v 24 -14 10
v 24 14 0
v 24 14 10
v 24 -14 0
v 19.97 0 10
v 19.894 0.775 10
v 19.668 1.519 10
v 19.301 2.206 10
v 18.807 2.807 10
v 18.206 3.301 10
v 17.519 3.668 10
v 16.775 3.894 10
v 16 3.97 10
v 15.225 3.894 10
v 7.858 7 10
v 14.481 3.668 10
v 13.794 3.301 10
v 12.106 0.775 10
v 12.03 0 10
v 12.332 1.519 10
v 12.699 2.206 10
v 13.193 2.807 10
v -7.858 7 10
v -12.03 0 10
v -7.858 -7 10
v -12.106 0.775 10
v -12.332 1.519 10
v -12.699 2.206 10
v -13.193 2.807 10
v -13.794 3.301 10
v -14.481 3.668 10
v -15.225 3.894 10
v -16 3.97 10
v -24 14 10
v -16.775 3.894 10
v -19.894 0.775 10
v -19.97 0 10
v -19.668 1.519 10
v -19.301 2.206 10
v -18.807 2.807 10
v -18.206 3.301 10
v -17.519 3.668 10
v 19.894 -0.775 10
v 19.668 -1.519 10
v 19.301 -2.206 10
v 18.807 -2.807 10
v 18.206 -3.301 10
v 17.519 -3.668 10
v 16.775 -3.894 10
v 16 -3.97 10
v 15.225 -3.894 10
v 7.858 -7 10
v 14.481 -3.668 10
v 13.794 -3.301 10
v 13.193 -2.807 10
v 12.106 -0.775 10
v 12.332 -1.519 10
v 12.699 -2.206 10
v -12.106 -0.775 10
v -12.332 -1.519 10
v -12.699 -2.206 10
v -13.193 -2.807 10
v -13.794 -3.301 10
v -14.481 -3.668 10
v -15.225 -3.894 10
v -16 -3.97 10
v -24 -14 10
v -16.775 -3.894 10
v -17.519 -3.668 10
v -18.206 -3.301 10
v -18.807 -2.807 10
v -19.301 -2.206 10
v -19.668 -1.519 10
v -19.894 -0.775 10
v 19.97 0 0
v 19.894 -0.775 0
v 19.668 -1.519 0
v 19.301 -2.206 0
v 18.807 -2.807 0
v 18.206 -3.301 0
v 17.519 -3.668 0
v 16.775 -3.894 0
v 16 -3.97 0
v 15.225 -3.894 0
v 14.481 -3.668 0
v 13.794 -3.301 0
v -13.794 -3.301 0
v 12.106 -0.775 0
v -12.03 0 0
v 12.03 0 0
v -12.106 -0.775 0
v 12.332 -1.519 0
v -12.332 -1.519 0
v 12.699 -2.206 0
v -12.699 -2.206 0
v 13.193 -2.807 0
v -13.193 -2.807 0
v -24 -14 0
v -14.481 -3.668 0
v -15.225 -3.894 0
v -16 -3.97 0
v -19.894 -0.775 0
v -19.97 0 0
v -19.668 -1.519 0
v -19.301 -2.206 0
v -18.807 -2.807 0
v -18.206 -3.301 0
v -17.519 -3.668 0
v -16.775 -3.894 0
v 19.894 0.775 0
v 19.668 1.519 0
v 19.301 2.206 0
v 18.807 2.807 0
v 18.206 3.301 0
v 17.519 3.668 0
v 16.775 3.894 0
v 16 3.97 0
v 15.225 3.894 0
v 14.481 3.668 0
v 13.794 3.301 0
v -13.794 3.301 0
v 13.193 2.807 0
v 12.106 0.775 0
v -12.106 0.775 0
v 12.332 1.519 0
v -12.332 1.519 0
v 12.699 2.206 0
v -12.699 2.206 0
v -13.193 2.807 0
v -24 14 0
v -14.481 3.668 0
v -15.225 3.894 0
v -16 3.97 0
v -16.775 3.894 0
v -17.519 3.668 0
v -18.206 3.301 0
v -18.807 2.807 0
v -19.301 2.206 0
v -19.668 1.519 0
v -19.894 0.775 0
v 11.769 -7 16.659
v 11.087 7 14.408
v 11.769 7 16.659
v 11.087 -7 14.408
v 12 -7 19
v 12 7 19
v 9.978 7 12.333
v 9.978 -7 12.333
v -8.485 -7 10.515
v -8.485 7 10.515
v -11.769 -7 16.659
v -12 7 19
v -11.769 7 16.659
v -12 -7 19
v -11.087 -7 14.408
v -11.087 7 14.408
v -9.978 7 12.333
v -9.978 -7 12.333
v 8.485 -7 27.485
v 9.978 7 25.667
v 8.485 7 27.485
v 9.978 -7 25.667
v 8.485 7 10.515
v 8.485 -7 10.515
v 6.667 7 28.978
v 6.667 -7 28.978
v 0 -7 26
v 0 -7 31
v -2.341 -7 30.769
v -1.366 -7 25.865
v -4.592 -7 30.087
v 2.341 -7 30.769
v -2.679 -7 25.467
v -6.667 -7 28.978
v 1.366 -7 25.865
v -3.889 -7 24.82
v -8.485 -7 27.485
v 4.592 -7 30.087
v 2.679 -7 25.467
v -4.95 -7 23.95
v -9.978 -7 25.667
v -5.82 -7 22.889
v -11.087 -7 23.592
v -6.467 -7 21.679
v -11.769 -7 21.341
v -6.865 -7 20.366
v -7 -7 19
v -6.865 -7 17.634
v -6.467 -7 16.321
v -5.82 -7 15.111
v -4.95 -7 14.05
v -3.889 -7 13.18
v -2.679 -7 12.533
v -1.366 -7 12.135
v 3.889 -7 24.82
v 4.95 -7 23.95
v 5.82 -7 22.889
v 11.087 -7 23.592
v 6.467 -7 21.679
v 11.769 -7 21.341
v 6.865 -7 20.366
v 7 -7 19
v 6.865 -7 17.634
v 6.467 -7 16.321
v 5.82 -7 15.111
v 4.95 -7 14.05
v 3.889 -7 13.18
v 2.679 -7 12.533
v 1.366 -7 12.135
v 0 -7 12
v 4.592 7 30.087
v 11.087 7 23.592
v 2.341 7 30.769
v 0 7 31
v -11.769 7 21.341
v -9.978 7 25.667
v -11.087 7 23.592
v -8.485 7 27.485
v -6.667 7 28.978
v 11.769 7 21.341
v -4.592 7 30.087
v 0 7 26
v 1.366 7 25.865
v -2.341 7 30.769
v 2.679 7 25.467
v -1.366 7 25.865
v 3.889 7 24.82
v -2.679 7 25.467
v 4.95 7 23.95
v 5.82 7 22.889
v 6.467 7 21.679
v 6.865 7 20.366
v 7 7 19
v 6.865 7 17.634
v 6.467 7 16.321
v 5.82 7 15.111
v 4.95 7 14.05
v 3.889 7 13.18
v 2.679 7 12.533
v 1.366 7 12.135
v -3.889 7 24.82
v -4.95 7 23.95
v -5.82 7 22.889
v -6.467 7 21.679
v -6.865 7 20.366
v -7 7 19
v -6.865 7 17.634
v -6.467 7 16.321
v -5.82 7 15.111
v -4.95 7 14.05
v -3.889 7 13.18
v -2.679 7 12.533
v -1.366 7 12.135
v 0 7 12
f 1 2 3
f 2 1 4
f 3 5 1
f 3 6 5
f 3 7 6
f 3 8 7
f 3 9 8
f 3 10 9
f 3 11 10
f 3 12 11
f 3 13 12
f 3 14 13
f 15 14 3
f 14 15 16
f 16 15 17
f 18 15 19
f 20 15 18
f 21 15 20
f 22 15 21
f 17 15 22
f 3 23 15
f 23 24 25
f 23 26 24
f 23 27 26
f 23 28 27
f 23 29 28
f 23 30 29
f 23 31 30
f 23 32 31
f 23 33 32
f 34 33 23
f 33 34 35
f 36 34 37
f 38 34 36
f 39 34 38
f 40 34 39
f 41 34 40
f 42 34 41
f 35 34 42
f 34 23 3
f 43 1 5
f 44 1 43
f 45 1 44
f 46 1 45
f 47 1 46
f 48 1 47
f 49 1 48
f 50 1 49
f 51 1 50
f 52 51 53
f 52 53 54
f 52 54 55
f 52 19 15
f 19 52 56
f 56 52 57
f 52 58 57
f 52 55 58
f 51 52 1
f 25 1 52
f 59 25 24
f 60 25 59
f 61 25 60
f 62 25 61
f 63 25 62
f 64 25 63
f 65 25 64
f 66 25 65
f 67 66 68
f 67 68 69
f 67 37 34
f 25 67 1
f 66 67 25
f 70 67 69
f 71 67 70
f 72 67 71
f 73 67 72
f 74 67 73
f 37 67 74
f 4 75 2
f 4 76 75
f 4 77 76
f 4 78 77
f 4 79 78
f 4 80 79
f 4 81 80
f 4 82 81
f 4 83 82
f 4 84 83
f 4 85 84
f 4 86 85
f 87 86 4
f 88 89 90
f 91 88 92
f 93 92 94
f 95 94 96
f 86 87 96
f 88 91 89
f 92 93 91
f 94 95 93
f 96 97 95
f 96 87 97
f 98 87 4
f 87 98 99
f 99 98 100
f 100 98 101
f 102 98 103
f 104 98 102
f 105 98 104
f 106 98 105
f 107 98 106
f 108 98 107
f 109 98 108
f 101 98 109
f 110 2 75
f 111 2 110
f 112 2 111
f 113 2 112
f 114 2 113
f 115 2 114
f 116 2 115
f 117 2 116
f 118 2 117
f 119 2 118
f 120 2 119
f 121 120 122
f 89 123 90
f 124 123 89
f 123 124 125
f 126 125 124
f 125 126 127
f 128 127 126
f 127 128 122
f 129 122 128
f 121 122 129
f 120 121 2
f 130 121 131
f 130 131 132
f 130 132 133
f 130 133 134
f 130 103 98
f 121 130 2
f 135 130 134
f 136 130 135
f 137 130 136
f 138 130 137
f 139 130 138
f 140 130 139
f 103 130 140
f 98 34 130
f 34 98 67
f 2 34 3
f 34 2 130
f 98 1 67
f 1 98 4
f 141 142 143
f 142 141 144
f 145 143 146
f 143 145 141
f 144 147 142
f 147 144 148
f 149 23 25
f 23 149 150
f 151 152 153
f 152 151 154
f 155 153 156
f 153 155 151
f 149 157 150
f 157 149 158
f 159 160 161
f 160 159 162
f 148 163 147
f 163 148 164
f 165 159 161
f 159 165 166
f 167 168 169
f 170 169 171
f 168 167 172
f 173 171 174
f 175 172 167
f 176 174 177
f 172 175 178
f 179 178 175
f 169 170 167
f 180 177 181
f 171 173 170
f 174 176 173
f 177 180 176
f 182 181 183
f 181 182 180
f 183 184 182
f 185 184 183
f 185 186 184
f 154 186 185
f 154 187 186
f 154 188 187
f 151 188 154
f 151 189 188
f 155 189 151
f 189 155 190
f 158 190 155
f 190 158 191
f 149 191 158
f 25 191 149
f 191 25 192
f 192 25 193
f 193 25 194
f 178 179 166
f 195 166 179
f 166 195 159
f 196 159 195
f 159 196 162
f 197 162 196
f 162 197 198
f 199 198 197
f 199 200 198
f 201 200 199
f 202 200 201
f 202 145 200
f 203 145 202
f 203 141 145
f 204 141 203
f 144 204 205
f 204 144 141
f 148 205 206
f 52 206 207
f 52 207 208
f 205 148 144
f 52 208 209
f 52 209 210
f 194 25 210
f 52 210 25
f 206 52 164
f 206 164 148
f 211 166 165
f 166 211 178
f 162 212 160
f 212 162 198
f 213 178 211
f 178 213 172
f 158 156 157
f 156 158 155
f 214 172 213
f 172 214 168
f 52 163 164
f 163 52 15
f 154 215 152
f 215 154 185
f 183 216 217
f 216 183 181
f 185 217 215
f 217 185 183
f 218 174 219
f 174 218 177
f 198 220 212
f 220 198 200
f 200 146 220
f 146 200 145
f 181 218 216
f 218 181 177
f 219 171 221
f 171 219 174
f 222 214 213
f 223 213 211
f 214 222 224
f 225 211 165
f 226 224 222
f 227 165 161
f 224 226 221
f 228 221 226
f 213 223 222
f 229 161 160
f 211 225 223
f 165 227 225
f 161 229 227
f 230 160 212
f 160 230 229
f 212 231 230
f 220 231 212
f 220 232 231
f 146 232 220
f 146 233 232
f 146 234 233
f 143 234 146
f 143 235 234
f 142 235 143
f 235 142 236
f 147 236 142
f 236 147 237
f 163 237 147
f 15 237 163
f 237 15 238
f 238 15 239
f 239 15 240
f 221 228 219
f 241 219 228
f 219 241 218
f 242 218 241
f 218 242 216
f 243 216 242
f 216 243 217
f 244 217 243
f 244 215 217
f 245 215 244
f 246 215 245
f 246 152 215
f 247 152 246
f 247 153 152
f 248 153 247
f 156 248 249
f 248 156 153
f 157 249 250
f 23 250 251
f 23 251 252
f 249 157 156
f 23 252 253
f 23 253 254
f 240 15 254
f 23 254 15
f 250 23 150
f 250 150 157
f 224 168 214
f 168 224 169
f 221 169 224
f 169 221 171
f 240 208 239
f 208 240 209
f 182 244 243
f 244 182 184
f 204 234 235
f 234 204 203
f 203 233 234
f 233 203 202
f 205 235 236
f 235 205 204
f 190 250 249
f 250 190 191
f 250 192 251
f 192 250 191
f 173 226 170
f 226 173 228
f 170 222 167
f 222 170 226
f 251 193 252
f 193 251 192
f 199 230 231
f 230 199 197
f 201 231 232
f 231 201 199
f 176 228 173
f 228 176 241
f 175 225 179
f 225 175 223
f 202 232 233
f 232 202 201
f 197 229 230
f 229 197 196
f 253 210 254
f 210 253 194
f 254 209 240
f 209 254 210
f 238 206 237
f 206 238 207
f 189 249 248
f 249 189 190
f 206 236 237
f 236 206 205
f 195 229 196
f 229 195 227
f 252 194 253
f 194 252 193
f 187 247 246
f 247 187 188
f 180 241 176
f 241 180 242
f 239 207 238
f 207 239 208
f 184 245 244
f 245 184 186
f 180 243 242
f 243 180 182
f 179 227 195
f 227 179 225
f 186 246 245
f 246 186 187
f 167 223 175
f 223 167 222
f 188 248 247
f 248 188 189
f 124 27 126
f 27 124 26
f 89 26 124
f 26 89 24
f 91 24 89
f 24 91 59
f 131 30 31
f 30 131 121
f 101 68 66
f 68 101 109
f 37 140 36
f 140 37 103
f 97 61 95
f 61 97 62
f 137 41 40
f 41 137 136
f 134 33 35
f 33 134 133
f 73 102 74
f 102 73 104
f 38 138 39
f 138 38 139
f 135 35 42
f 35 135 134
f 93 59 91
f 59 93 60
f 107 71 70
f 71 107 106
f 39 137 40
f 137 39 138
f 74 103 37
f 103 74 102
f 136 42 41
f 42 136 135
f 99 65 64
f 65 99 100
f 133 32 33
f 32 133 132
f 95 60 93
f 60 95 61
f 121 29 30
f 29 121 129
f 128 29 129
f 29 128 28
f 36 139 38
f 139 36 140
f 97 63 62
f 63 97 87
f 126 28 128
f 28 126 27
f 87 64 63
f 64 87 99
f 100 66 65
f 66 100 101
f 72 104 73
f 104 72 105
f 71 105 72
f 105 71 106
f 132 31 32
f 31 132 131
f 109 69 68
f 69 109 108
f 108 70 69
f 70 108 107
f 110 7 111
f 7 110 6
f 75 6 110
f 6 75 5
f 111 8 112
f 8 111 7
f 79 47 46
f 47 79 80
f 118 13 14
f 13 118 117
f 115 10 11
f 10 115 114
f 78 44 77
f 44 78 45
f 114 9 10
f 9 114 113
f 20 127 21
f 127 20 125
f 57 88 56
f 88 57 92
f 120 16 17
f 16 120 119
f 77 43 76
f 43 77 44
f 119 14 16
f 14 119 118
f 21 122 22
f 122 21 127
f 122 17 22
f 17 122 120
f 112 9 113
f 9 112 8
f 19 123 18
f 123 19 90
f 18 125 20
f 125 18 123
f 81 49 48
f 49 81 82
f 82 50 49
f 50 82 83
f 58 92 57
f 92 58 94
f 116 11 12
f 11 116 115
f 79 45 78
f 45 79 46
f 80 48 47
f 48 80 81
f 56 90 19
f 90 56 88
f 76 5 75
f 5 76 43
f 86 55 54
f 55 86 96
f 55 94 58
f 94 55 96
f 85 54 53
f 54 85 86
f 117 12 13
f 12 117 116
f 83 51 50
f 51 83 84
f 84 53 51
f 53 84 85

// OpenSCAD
$fn = 32;

// ----------------------------------------------------------------------
// Deck eye: 24 mm eye on a 48 mm base
// ----------------------------------------------------------------------

// --- parameters (mm) ---
base_l = 48;              // base length
base_w = 28;              // base width
base_t = 10;              // base thickness
eye_r = 12;               // eye outside radius
eye_bore = 14;            // eye bore diameter
eye_w = 14;               // eye thickness
eye_z = 19;               // eye centre height
holes_d = 7.94;           // fixing holes
hole_x = 16;              // fixing hole spacing

difference() {
  union() {
    translate([-24, -14, 0]) cube([base_l, base_w, base_t]);
    /* eye standing upright, its foot sunk 3 mm into the base */
    translate([0, -7, 19]) rotate([-90, 0, 0]) cylinder(h = 14, d = 24);
  }
  /* eye bore, 2.5 mm clear of both faces */
  translate([0, -9.5, 19]) rotate([-90, 0, 0]) cylinder(h = 19, d = 14);
  translate([-16, 0, -2.5]) cylinder(h = base_t + 5, d = holes_d);
  translate([16, 0, -2.5]) cylinder(h = base_t + 5, d = holes_d);
}
